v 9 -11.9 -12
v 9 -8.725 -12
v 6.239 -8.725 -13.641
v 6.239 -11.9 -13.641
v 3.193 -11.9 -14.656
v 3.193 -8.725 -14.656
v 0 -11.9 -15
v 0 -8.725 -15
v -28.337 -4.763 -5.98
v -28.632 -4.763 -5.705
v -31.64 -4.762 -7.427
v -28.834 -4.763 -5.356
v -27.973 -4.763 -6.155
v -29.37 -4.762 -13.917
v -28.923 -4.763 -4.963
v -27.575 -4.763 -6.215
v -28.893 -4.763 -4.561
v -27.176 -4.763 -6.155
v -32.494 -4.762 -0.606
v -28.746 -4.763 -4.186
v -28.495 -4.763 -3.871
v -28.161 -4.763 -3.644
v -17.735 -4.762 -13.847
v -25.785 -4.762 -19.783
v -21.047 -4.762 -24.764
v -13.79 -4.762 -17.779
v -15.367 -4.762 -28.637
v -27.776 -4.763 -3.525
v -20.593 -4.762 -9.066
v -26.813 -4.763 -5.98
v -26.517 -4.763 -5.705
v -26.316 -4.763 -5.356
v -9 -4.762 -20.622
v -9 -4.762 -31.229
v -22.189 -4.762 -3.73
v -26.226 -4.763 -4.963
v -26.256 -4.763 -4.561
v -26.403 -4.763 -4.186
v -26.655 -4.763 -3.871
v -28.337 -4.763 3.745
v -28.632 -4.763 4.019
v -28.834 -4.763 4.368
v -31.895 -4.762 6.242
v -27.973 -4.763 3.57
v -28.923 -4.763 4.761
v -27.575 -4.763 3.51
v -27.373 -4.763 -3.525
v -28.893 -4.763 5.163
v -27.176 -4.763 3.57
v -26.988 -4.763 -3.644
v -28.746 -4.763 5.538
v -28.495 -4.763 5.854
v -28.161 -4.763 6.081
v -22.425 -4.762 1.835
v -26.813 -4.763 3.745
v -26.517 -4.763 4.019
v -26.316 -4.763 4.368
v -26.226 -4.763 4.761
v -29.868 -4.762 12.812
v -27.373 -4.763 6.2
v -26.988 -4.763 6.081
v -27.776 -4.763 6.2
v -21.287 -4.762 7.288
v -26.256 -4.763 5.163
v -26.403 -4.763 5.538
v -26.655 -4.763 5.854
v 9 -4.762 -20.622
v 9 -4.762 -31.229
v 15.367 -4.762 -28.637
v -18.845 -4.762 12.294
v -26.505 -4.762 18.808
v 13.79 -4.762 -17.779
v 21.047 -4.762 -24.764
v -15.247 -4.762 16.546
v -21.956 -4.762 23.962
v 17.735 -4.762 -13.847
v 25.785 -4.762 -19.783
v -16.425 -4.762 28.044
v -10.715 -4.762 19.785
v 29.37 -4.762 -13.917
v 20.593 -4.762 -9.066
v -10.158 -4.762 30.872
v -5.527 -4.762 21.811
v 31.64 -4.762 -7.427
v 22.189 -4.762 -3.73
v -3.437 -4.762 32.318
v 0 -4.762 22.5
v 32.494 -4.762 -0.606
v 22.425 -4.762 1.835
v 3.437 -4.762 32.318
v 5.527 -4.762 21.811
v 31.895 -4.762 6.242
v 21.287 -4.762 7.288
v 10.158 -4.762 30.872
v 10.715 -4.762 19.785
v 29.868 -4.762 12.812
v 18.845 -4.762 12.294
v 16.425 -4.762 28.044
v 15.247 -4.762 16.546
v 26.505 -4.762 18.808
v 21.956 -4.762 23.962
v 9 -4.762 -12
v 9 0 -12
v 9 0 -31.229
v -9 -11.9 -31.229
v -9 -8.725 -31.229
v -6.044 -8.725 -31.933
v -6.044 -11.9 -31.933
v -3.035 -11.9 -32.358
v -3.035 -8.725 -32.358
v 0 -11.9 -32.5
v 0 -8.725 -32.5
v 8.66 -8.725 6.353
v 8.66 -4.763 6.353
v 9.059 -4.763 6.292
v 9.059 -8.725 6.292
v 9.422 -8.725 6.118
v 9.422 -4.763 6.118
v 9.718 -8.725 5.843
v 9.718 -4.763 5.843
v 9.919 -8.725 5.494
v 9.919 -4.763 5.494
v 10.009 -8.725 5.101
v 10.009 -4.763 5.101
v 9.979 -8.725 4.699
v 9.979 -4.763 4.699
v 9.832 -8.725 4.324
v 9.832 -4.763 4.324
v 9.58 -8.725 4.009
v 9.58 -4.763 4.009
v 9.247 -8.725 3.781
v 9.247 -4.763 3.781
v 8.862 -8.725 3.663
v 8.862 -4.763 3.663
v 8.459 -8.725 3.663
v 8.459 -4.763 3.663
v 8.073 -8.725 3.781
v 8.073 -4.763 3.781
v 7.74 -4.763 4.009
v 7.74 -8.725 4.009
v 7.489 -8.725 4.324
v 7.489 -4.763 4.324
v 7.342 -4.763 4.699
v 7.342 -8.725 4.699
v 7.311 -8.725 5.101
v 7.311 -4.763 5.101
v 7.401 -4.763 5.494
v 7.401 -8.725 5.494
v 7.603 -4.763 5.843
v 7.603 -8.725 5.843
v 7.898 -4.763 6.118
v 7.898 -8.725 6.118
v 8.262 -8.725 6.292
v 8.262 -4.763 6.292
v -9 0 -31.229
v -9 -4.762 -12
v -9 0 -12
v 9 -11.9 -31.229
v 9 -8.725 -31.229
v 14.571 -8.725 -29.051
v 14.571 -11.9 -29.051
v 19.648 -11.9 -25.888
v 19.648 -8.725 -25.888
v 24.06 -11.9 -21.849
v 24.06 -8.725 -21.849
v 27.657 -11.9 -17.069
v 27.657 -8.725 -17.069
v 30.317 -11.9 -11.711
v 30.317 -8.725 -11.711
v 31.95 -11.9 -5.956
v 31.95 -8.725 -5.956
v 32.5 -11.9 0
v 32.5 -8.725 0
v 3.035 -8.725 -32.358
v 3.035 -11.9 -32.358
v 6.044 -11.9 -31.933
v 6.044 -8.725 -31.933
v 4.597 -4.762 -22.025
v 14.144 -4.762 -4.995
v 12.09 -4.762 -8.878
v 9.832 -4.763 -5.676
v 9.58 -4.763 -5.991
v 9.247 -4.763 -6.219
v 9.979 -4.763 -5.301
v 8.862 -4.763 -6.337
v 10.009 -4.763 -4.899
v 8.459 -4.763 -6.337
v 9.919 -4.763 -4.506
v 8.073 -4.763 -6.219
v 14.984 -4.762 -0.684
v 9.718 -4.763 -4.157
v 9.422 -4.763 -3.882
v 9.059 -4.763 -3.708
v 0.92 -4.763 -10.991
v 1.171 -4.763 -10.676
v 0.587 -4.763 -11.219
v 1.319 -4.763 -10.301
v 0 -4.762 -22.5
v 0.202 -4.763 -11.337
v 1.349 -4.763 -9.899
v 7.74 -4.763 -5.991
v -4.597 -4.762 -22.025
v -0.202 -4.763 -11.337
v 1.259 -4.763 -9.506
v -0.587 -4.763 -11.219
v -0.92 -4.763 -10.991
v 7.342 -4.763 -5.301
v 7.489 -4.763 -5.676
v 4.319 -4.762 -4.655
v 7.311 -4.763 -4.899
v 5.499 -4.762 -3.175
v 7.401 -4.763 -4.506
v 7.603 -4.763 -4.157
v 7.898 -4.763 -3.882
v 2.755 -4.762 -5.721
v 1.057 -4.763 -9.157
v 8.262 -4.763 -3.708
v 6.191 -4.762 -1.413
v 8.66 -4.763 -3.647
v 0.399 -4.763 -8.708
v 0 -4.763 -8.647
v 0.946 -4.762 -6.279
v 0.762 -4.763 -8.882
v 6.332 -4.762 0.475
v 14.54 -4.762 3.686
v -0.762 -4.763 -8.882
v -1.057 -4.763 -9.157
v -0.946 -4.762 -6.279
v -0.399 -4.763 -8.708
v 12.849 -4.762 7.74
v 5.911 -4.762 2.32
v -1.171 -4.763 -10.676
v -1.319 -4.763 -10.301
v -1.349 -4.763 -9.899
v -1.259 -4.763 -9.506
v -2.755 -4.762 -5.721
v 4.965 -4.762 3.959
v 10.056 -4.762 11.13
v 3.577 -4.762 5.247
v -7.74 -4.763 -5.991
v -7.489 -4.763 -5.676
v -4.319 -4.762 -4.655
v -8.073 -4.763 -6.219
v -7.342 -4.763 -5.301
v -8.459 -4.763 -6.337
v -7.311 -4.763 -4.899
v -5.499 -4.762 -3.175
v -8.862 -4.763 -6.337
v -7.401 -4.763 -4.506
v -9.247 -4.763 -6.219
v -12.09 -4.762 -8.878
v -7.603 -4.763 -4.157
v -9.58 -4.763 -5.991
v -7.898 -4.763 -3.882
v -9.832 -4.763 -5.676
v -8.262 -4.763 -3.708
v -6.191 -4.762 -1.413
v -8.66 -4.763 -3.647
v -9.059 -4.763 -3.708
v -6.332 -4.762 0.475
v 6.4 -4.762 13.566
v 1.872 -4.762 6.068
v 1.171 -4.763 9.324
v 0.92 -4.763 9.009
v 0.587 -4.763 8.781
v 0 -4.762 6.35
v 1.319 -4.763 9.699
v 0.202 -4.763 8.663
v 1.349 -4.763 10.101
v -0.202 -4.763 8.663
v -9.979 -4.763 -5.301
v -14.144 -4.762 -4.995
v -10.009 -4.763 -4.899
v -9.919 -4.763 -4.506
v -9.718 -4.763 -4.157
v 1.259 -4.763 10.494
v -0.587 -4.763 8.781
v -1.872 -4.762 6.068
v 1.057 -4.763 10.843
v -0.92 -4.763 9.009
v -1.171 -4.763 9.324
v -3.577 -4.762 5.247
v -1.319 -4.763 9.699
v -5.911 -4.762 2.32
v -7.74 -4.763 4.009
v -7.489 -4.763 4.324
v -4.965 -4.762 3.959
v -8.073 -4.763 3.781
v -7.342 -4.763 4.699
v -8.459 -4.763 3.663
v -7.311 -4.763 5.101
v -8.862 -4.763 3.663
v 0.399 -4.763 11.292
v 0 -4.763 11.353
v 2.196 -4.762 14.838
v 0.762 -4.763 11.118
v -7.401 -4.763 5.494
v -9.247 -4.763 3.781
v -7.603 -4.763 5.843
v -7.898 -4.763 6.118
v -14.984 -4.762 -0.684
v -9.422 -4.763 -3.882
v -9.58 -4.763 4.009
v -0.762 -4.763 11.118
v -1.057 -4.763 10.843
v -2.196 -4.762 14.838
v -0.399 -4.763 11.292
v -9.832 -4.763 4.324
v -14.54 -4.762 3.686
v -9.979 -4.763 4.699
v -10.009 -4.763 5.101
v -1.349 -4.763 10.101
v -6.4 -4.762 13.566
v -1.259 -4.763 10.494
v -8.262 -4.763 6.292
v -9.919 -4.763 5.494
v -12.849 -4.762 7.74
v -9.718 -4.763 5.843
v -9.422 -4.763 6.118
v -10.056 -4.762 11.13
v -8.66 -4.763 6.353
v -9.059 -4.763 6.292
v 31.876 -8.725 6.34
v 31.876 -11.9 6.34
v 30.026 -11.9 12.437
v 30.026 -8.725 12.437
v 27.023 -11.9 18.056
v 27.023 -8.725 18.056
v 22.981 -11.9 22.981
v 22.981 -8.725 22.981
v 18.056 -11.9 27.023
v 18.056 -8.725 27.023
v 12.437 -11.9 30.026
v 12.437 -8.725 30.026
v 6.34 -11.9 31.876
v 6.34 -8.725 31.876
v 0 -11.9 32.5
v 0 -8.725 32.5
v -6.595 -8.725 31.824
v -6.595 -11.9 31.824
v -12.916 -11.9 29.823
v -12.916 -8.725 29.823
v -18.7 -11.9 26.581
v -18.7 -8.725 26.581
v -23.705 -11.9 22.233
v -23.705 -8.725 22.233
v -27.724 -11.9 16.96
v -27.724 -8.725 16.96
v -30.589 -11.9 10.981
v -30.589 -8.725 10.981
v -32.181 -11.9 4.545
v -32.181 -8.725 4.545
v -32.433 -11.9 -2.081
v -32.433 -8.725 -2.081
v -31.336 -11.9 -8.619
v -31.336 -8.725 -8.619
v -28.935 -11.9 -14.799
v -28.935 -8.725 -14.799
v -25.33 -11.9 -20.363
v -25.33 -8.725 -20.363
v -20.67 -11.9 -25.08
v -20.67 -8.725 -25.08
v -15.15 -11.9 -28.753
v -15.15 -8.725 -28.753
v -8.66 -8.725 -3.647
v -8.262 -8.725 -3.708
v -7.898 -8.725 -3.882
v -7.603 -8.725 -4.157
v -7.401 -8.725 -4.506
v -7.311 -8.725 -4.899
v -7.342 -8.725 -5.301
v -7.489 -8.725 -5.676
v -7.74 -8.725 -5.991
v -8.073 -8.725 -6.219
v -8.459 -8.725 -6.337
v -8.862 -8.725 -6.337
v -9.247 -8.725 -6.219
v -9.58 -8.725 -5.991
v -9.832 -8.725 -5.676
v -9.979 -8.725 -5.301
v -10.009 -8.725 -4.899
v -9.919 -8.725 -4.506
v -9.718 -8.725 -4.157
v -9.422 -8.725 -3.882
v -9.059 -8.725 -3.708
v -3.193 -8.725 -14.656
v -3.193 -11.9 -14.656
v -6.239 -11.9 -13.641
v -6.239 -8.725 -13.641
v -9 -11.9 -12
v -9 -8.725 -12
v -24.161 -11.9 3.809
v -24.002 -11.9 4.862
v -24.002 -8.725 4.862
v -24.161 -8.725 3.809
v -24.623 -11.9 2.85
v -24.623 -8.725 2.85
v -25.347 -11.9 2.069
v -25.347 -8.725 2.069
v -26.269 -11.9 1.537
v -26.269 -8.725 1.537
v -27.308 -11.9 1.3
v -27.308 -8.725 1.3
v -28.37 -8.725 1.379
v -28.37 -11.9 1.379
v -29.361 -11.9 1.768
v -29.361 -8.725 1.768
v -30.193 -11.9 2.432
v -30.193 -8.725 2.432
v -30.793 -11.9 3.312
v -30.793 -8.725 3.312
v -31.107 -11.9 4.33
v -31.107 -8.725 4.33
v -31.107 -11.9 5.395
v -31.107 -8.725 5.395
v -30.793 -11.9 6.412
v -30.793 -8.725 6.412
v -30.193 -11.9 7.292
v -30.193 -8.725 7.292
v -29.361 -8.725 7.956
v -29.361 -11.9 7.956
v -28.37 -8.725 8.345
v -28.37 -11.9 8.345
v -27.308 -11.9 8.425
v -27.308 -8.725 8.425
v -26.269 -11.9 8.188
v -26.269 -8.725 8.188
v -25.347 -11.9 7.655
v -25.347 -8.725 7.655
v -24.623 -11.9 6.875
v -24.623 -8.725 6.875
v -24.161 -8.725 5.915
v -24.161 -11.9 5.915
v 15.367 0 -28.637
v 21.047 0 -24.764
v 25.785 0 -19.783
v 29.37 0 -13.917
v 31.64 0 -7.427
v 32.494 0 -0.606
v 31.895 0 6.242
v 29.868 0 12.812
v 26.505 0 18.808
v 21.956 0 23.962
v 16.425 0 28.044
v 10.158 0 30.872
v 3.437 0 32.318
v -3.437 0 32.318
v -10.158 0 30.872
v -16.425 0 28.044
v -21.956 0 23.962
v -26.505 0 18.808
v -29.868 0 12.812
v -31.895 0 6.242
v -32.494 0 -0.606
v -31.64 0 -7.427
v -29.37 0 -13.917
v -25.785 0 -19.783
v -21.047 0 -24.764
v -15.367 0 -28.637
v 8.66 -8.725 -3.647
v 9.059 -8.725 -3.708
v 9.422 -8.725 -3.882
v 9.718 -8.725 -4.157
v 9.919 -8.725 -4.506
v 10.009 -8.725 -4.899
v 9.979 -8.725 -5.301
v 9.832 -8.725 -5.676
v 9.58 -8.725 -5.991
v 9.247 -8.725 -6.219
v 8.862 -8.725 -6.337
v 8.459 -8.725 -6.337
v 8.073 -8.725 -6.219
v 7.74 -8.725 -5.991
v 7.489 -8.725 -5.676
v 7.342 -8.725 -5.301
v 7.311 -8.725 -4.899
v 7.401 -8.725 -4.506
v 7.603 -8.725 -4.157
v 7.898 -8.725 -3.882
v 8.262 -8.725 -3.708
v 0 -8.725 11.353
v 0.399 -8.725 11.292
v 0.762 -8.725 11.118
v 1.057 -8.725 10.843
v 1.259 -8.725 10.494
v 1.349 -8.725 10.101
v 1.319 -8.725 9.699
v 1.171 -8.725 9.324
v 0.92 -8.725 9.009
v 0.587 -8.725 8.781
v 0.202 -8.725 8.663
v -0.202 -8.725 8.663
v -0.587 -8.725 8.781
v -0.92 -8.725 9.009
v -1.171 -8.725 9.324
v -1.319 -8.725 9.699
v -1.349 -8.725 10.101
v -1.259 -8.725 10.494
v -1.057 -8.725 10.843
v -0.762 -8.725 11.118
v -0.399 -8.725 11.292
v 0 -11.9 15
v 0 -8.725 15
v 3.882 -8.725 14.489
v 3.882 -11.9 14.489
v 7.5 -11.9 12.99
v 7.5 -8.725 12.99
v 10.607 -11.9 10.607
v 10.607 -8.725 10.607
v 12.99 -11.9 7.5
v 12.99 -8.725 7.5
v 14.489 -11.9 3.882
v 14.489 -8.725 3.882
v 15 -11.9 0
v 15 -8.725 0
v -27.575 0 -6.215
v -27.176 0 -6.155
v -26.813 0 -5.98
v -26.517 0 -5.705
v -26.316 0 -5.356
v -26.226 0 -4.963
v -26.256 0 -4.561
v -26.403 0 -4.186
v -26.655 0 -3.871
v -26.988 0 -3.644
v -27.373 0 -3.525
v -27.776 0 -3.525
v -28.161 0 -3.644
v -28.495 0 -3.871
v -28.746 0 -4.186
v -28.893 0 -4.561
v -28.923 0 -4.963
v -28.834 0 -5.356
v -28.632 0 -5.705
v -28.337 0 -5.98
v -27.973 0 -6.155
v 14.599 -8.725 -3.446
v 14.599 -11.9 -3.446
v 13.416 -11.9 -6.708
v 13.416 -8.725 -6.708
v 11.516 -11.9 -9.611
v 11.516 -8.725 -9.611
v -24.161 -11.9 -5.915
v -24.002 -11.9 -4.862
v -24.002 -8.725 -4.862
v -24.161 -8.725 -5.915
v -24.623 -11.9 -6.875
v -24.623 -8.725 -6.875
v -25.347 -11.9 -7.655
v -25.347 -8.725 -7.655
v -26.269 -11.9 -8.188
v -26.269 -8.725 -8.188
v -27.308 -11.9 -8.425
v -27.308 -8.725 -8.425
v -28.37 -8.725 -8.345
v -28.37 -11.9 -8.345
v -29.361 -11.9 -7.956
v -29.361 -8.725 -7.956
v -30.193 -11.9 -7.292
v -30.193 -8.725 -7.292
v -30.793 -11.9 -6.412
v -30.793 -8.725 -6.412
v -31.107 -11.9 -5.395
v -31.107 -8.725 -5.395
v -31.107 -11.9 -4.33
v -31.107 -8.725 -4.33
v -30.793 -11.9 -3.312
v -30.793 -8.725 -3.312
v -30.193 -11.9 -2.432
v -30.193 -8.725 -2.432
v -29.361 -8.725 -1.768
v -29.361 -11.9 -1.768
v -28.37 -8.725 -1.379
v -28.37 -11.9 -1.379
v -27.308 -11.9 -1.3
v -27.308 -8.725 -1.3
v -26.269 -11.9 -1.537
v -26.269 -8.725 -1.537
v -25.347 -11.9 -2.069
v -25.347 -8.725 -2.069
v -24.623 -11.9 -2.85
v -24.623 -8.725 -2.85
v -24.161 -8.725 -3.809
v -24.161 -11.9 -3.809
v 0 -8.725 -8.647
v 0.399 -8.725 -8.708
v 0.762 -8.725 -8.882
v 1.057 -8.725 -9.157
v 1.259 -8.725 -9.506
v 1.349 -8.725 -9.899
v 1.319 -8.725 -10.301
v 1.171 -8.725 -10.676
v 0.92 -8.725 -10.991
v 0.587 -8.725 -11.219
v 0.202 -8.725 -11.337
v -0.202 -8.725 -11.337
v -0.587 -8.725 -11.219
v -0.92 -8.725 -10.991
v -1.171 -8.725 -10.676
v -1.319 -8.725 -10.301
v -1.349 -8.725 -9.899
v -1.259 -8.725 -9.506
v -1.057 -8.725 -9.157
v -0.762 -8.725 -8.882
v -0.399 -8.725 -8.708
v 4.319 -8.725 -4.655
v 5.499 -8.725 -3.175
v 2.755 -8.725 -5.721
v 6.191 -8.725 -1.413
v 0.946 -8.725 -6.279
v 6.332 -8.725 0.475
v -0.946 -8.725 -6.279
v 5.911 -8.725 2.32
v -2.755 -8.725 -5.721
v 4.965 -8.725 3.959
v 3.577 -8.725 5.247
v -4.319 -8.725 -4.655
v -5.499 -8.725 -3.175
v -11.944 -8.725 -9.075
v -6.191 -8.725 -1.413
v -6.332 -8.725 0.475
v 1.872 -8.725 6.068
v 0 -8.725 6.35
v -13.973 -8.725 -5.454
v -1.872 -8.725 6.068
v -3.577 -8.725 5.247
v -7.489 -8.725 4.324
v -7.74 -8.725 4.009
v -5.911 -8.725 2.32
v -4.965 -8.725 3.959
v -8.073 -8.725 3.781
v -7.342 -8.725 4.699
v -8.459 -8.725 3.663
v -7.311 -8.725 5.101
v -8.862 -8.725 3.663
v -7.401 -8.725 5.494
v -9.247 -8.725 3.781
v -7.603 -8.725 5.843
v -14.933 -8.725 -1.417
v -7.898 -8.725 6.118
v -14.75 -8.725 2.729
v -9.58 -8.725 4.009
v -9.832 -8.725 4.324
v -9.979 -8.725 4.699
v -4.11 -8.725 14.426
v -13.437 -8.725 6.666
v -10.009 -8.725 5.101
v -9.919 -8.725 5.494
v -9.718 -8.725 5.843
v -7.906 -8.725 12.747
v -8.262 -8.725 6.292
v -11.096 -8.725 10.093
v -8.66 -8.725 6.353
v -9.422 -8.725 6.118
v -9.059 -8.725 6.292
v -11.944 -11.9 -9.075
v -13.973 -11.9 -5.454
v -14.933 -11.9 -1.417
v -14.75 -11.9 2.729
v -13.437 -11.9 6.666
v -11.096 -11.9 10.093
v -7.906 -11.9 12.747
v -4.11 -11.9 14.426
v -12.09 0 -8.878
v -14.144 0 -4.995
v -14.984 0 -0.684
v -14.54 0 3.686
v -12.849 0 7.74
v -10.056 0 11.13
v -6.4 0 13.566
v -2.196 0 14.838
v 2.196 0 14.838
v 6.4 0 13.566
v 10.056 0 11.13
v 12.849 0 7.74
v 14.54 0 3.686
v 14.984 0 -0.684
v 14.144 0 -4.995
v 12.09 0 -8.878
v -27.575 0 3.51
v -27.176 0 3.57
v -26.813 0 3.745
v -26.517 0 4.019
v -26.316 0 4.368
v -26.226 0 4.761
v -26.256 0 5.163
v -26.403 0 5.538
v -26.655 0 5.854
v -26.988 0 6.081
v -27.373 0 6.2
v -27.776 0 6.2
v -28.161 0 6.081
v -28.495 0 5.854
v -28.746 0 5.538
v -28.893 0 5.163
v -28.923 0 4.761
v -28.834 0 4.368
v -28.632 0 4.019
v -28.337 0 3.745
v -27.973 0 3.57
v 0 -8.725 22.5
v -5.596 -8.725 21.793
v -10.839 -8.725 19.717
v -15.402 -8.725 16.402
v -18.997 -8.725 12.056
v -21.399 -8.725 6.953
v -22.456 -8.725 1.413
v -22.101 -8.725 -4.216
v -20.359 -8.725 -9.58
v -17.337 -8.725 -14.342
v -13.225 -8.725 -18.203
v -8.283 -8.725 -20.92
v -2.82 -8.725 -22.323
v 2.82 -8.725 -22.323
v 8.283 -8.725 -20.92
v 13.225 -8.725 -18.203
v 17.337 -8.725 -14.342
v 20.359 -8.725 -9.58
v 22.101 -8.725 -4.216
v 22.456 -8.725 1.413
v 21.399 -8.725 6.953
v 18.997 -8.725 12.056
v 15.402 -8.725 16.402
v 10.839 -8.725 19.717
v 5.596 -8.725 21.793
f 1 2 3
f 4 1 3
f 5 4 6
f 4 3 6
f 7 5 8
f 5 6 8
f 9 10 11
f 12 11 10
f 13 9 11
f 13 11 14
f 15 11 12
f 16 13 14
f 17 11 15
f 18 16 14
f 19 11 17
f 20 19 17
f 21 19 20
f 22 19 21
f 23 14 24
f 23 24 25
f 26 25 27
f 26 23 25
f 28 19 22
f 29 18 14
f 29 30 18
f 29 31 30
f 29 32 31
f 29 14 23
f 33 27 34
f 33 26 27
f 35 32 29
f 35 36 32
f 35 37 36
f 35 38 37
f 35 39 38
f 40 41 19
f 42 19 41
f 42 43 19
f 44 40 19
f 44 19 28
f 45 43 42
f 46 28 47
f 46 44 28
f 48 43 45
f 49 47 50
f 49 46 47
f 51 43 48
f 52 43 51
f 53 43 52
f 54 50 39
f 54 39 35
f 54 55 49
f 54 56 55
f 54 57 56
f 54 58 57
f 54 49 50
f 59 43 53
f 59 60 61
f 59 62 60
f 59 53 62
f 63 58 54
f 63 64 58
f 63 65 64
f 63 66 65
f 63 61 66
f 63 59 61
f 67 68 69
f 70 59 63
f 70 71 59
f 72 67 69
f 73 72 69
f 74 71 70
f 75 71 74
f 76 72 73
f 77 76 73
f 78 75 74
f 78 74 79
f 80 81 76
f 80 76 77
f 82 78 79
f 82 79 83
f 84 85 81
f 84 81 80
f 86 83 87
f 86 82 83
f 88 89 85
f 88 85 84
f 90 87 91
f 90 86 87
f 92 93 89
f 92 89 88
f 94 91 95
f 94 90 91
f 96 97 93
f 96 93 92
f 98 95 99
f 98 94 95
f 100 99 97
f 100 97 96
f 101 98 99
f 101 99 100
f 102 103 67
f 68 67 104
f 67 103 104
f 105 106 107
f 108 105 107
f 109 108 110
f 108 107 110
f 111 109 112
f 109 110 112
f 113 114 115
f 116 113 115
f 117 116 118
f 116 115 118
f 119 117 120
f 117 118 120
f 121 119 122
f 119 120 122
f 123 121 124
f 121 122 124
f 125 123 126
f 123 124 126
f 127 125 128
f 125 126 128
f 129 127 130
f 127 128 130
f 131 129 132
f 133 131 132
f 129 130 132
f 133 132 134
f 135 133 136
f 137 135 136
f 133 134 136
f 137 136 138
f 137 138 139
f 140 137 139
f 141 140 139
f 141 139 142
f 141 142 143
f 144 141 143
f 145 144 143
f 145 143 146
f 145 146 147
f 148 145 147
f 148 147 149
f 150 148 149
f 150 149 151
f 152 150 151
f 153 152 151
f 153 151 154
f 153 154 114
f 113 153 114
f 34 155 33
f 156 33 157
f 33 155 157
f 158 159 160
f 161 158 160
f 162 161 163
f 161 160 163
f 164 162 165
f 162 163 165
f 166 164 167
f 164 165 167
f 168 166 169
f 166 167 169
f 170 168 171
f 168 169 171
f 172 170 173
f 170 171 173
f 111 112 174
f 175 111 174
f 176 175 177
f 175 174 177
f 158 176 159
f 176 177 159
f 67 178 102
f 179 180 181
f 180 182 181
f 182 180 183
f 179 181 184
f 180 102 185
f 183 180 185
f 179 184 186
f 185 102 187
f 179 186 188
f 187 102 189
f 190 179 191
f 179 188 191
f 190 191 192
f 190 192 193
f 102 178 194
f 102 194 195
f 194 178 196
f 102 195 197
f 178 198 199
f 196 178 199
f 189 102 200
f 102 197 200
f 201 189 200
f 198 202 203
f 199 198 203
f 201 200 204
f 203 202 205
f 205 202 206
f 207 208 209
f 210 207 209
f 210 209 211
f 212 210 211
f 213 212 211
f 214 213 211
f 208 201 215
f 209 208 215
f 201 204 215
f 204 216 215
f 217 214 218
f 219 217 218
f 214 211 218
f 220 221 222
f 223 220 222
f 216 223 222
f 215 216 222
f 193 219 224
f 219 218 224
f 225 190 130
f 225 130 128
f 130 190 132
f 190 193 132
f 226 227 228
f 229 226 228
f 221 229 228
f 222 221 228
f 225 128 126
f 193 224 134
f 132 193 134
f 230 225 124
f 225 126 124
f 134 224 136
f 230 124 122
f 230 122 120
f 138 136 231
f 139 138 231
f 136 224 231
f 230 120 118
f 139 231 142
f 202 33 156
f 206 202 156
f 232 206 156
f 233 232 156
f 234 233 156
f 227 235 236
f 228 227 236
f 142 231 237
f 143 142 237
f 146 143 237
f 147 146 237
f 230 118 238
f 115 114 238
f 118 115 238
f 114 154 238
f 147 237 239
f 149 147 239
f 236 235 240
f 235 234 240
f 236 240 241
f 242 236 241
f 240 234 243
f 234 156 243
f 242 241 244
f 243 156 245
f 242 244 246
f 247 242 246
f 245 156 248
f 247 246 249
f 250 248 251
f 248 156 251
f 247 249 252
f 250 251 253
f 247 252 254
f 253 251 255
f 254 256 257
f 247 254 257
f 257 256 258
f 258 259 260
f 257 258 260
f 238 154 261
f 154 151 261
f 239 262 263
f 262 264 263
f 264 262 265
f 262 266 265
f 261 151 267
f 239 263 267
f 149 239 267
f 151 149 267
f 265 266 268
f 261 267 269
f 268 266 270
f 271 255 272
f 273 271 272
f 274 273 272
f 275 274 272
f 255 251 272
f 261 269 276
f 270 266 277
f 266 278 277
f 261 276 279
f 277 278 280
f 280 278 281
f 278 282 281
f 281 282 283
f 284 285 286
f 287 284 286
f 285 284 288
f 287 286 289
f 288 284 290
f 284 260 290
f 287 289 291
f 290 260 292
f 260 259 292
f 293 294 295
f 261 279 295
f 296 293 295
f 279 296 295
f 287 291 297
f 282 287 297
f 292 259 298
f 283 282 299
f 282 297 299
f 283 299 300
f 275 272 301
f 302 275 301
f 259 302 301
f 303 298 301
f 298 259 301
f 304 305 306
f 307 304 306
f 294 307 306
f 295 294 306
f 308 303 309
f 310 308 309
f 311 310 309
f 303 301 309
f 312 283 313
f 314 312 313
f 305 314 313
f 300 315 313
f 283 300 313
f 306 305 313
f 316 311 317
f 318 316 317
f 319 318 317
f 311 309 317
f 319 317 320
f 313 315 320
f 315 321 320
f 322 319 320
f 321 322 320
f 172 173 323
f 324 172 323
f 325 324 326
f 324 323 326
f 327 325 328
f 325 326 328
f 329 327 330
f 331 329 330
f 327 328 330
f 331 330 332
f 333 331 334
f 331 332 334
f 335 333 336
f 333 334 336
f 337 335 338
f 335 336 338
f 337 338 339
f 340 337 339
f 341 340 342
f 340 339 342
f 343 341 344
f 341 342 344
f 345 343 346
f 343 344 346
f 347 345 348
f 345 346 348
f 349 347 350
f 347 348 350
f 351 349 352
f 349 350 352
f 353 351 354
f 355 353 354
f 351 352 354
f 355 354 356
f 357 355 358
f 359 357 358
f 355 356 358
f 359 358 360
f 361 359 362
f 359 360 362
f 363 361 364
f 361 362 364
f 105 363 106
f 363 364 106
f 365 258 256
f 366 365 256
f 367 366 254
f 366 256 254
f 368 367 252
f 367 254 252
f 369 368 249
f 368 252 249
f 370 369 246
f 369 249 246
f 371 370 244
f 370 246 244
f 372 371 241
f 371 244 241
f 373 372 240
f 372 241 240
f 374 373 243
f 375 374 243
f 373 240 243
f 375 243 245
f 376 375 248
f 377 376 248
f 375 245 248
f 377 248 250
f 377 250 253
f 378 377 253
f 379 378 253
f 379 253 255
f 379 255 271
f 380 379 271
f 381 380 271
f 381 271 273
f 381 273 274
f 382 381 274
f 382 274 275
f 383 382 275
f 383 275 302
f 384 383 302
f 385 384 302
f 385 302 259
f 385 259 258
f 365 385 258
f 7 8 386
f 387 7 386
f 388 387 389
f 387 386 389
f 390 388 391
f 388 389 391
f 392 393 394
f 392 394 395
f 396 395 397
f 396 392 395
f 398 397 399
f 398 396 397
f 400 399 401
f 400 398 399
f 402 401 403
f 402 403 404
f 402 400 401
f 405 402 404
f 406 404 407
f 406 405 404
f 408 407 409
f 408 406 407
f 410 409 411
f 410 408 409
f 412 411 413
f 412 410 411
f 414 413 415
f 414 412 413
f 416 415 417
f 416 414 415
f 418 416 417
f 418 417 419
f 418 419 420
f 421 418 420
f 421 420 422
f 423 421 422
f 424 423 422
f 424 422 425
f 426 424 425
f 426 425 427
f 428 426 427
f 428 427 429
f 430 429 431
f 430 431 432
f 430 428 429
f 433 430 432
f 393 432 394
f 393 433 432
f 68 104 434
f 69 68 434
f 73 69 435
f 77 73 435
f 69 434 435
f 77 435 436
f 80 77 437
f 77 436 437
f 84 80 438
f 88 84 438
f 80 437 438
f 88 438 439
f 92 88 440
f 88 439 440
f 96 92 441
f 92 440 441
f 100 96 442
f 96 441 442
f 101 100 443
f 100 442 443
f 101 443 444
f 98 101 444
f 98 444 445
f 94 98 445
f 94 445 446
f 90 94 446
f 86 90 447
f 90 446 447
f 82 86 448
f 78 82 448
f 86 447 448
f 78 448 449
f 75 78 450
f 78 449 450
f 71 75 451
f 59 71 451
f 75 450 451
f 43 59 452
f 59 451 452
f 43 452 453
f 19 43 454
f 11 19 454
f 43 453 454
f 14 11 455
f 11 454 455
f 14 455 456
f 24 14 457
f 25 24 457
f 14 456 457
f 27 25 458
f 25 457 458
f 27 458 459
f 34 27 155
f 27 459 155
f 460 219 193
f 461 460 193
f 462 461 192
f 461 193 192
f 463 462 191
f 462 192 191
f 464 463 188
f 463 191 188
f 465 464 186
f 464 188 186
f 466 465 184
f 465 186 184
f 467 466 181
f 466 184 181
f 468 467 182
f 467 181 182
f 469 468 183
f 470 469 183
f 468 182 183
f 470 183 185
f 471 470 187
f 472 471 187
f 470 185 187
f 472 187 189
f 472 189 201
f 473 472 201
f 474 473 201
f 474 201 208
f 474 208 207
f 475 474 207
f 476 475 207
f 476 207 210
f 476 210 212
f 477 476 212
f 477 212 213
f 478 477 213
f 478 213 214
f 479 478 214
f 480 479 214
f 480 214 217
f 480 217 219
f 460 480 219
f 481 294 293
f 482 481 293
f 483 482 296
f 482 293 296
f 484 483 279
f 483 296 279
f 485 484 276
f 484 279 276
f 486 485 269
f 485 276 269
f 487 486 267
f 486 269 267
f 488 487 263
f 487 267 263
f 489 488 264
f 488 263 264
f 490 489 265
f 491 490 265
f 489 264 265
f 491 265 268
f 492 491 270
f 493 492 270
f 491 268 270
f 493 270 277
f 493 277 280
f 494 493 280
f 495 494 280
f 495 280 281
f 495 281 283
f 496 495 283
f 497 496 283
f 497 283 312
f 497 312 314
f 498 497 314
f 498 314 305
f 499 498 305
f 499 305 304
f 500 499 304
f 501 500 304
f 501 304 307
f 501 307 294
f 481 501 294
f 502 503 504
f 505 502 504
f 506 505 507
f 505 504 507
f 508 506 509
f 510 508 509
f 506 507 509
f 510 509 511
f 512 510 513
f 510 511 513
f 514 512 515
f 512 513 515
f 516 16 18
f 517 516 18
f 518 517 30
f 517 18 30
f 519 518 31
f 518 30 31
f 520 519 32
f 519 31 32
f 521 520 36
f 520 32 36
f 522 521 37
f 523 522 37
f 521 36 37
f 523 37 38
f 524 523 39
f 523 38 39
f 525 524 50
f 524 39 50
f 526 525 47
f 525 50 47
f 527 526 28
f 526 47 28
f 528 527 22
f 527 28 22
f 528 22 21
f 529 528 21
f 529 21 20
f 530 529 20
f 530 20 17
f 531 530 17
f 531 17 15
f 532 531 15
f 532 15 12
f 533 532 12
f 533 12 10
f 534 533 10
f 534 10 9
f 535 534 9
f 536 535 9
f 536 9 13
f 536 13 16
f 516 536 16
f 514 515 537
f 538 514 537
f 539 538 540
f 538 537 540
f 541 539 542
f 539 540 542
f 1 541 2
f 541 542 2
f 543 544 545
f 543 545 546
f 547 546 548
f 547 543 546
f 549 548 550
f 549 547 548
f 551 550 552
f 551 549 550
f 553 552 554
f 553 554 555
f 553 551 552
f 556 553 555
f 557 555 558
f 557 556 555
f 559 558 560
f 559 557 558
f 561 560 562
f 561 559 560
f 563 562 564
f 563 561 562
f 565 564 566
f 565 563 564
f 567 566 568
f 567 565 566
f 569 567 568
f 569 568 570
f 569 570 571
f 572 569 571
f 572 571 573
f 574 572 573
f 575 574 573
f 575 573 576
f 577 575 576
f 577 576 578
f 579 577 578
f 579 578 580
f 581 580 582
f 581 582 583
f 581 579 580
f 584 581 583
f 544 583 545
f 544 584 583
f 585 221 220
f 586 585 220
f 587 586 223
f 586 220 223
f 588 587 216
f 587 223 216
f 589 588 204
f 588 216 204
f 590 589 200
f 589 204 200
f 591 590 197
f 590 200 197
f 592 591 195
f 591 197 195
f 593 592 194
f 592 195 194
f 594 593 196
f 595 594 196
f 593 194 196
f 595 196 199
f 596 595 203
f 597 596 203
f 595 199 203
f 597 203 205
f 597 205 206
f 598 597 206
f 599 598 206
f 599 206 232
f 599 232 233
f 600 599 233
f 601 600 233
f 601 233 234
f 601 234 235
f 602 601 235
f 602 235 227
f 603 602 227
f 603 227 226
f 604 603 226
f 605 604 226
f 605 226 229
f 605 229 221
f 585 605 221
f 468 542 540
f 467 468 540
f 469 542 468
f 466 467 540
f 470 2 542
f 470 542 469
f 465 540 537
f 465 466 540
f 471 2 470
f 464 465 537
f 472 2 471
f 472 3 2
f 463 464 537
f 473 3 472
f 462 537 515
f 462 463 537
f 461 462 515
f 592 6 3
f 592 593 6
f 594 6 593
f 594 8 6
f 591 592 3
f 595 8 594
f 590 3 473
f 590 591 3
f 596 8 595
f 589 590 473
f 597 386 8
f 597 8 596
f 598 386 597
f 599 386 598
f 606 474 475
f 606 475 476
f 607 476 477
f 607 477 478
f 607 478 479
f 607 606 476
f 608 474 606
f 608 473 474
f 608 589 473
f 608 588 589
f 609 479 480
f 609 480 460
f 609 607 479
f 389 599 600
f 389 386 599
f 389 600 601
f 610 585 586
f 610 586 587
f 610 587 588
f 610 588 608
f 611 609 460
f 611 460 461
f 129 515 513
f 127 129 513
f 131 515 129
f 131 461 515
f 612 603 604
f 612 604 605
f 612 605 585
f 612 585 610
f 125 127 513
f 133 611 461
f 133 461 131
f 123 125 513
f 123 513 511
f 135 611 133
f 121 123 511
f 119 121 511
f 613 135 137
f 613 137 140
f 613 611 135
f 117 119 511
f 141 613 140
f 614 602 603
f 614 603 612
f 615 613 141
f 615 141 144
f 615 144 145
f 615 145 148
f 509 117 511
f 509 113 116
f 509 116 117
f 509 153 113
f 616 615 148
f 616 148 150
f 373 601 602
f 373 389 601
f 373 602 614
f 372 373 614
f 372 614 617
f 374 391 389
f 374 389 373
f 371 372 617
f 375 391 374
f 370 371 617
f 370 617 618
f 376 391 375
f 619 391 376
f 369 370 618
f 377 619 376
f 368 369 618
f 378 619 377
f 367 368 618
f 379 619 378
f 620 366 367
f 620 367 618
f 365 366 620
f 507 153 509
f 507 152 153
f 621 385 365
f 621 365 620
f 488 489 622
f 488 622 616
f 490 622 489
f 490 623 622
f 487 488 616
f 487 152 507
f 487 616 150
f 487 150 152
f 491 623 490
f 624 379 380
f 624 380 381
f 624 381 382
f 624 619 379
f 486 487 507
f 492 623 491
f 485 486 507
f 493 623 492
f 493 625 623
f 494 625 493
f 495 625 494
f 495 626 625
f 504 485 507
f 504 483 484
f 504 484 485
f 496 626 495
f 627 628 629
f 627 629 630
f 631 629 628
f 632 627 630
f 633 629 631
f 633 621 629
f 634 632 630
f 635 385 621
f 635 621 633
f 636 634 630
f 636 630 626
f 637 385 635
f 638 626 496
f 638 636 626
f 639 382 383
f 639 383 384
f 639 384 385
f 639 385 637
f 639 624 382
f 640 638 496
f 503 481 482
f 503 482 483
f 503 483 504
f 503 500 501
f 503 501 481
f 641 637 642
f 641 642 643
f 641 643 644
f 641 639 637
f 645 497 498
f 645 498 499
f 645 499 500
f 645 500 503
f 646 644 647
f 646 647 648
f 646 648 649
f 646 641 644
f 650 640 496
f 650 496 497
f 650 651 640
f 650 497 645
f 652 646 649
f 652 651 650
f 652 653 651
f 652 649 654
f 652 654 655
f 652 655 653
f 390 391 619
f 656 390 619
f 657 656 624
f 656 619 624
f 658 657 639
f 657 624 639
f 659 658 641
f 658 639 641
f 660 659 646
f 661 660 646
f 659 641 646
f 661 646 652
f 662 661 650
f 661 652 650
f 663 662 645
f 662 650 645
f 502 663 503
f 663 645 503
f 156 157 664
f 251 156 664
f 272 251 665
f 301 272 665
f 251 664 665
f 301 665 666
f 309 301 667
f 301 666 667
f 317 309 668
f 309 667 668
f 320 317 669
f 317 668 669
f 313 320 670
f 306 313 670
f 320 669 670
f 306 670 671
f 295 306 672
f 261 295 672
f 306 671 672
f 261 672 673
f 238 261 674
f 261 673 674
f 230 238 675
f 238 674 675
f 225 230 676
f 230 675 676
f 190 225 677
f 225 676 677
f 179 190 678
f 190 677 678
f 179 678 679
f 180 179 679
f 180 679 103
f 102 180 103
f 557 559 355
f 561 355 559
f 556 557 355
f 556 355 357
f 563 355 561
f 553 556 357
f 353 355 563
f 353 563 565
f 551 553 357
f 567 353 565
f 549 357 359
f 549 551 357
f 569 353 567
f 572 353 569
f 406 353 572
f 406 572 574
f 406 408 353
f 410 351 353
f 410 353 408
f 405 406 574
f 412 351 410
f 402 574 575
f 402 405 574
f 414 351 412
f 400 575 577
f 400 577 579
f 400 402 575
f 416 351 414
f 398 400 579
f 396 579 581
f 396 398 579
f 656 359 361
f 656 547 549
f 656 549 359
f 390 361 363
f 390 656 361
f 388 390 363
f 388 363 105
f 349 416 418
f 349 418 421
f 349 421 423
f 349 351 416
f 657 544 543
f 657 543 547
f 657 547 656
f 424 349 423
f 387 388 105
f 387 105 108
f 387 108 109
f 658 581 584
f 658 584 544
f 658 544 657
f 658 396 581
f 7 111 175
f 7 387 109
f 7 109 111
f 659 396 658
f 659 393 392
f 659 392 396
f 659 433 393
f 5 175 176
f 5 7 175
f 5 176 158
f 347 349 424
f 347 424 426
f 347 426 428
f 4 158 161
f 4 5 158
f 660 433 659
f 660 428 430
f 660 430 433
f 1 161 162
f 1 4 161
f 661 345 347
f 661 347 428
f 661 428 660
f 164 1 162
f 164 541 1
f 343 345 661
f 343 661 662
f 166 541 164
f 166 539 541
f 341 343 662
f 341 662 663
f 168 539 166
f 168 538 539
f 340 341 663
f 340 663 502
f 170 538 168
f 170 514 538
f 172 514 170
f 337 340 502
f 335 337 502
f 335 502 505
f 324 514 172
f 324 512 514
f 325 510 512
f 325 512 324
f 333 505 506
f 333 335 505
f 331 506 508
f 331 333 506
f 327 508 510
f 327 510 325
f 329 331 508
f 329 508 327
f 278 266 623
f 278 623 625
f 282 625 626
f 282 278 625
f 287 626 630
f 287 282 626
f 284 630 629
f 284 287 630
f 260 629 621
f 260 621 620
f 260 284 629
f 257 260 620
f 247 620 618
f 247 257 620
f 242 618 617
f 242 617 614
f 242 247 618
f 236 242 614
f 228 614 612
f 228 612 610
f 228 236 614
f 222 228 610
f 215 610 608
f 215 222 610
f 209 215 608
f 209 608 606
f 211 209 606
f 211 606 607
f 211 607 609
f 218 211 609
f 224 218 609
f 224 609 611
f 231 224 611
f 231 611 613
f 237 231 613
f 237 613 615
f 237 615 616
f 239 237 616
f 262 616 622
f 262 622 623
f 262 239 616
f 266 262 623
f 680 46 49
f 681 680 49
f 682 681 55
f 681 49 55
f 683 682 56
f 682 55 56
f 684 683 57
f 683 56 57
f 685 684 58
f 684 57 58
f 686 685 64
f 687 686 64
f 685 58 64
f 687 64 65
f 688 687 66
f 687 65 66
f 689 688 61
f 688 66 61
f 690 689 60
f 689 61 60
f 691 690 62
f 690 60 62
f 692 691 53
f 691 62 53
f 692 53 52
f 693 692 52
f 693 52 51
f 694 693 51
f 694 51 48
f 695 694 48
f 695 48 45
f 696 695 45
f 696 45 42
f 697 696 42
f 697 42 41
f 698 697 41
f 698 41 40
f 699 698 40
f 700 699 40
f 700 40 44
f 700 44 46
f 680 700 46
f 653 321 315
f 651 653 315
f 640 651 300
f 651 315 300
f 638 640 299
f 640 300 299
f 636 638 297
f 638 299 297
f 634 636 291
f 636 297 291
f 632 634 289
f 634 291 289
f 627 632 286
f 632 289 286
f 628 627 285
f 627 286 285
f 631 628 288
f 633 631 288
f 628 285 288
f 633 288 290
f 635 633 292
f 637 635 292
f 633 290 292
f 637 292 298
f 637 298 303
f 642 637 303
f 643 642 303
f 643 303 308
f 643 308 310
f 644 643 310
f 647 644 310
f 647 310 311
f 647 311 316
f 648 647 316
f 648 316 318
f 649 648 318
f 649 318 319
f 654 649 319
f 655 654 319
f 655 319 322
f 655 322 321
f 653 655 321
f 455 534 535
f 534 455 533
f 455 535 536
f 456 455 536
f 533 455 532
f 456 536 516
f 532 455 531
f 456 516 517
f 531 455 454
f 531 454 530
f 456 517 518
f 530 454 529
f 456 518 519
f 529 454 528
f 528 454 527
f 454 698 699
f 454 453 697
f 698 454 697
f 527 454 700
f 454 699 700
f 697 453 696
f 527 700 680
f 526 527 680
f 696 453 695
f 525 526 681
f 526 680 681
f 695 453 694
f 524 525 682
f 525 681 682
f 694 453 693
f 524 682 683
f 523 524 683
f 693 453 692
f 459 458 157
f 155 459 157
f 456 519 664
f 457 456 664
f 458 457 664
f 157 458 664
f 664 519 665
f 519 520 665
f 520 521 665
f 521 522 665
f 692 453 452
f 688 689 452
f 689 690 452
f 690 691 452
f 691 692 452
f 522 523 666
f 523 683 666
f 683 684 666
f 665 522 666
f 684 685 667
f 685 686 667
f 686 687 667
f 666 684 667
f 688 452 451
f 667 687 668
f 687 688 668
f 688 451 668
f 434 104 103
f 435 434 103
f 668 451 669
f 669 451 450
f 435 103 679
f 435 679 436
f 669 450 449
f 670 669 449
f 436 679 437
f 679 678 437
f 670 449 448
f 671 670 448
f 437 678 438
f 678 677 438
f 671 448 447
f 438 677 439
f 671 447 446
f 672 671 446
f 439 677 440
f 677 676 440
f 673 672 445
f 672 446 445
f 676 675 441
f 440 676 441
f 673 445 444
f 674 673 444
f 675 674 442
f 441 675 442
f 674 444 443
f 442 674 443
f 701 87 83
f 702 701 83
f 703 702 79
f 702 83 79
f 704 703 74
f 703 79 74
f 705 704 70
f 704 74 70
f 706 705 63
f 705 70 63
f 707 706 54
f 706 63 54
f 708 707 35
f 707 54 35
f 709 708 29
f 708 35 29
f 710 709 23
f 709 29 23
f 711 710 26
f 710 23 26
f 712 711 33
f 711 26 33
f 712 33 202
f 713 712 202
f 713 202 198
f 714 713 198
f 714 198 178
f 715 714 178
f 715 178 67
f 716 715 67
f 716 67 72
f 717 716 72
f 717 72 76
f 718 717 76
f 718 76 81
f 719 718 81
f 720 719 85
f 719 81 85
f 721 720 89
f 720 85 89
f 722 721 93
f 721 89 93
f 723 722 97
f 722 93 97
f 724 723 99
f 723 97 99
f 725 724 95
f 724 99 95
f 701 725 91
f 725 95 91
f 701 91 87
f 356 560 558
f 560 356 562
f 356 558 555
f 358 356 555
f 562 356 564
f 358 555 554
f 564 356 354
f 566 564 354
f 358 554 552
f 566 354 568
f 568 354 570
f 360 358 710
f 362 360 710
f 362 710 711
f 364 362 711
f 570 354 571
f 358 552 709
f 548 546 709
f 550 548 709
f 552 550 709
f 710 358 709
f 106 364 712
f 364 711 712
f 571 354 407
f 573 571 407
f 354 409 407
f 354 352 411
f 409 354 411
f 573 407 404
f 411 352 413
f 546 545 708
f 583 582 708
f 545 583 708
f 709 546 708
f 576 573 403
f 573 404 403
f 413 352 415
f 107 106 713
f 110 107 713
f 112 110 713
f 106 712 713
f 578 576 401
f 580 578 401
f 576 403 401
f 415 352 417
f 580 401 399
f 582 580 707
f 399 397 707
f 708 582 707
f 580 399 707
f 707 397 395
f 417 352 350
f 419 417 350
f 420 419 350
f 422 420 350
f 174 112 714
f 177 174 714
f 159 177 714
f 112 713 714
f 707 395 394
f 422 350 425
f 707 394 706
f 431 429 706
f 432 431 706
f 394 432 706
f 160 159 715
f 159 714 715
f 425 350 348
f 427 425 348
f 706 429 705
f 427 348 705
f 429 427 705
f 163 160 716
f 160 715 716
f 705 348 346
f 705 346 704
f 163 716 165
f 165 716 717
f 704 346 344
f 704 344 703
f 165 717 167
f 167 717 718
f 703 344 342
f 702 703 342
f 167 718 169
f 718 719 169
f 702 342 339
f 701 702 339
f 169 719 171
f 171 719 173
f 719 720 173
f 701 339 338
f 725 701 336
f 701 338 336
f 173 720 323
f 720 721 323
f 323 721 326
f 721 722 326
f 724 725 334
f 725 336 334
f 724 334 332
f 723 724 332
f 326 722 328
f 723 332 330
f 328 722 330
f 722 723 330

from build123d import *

# Parameters (mm, degrees)
SPINDLE_START                             = 4.7625
SKETCH6_R                                 = 22.5
SKETCH6_R_2                               = 6.35
SPINDLE_CENTER_DEPTH                      = 3.9624
LOWER_START                               = 8.7249
LOWER_FLANGE_DEPTH                        = 3.175
UPPER_FLANGE_DEPTH                        = 4.7625
F_6_32_TAPPED_HOLE1_D                     = 2.7051
CBORE_START                               = -11.8999
CBORE_FOR_6_SOCKET_HEAD_CAP_SCREW1_OUTL_R = 3.57251
CBORE_FOR_6_SOCKET_HEAD_CAP_SCREW1_DEPTH  = 3.175
F_6_32_TAPPED_HOLE3_D                     = 2.7051
F_6_32_TAPPED_HOLE3_DEPTH                 = 9.49
F_6_32_TAPPED_HOLE3_TIP                   = 0.81269403


# Read off the part's stored shape, not the designer's step: CBORE for #6 Socket Head Cap Screw1
with BuildPart() as part:
    # Sketch6 → Spindle Center (new body)
    with BuildSketch(Plane.XZ.offset(SPINDLE_START)):
        with Locations(Location((0, 0, 0), (0, 0, 90))):
            Circle(SKETCH6_R)
        with Locations(Location((0, 0, 0), (0, 0, 90))):
            Circle(SKETCH6_R_2, mode=Mode.SUBTRACT)
    extrude(amount=SPINDLE_CENTER_DEPTH)

    # Sketch6<3> → Lower Flange (add)
    with BuildSketch(Plane.XZ.offset(LOWER_START)):
        with BuildLine():
            Line((0, -32.5), (0, -22.5))
            ThreePointArc((0, -22.5), (-4.596966983, -22.025392041), (-9, -20.621590627))
            Line((-9, -20.621590627), (-9, -31.228992939))
            ThreePointArc((-9, -31.228992939), (-4.544652323, -32.180679534), (0, -32.5))
        make_face()
        with BuildLine():
            Line((-9, -31.228992939), (-9, -20.621590627))
            ThreePointArc((-9, -20.621590627), (-22.025392041, 4.596966983), (0, 22.5))
            Line((0, 22.5), (0, 32.5))
            ThreePointArc((0, 32.5), (-32.180679534, 4.544652323), (-9, -31.228992939))
        make_face()
        with BuildLine():
            ThreePointArc((22.5, 0), (18.824850597, -12.323757544), (9, -20.621590627))
            Line((9, -20.621590627), (9, -31.228992939))
            ThreePointArc((9, -31.228992939), (25.968731197, -19.541622246), (32.5, 0))
            ThreePointArc((32.5, 0), (22.980970389, 22.980970389), (0, 32.5))
            Line((0, 32.5), (0, 22.5))
            ThreePointArc((0, 22.5), (15.909902577, 15.909902577), (22.5, 0))
        make_face()
        with BuildLine():
            Line((9, -31.228992939), (9, -20.621590627))
            ThreePointArc((9, -20.621590627), (4.596966983, -22.025392041), (0, -22.5))
            Line((0, -22.5), (0, -32.5))
            ThreePointArc((0, -32.5), (4.544652323, -32.180679534), (9, -31.228992939))
        make_face()
        with BuildLine():
            ThreePointArc((15, 0), (13.416407865, -6.708203932), (9, -12))
            Line((9, -12), (9, -20.621590627))
            ThreePointArc((9, -20.621590627), (18.824850597, -12.323757544), (22.5, 0))
            ThreePointArc((22.5, 0), (15.909902577, 15.909902577), (0, 22.5))
            Line((0, 22.5), (0, 15))
            ThreePointArc((0, 15), (10.606601718, 10.606601718), (15, 0))
        make_face()
        with BuildLine():
            Line((9, -20.621590627), (9, -12))
            ThreePointArc((9, -12), (4.74341649, -14.230249471), (0, -15))
            Line((0, -15), (0, -22.5))
            ThreePointArc((0, -22.5), (4.596966983, -22.025392041), (9, -20.621590627))
        make_face()
        with BuildLine():
            Line((0, -22.5), (0, -15))
            ThreePointArc((0, -15), (-4.74341649, -14.230249471), (-9, -12))
            Line((-9, -12), (-9, -20.621590627))
            ThreePointArc((-9, -20.621590627), (-4.596966983, -22.025392041), (0, -22.5))
        make_face()
        with BuildLine():
            Line((-9, -20.621590627), (-9, -12))
            ThreePointArc((-9, -12), (-14.230249471, 4.74341649), (0, 15))
            Line((0, 15), (0, 22.5))
            ThreePointArc((0, 22.5), (-22.025392041, 4.596966983), (-9, -20.621590627))
        make_face()
    extrude(amount=LOWER_FLANGE_DEPTH)

    # Sketch6<4> → Upper Flange (add)
    with BuildSketch(Plane.XZ):
        with BuildLine():
            Line((9, -12), (9, -31.228992939))
            ThreePointArc((9, -31.228992939), (0, 32.5), (-9, -31.228992939))
            Line((-9, -31.228992939), (-9, -12))
            ThreePointArc((-9, -12), (0, 15), (9, -12))
        make_face()
    extrude(amount=UPPER_FLANGE_DEPTH)

    # #6-32 Tapped Hole1 (through all)
    with Locations(Plane(origin=(0, -8.7249, 10), x_dir=(0, 0, -1), z_dir=(0, -1, 0))):
        with Locations((0, 0), (15, -8.660254038), (15, 8.660254038), (5, -8.660254038), (20, 0), (5, 8.660254038)):
            Hole(F_6_32_TAPPED_HOLE1_D / 2)

    # CBORE for #6 Socket Head Cap Screw1 outl → CBORE for #6 Socket Head Cap Screw1 (cut)
    with BuildSketch(Plane(origin=(0, 0, 0), x_dir=(1, 0, 0), z_dir=(0, 1, 0)).offset(CBORE_START)):
        with Locations((-27.574617084, -4.862148975)):
            Circle(CBORE_FOR_6_SOCKET_HEAD_CAP_SCREW1_OUTL_R)
        with Locations((-27.574617084, 4.862148975)):
            Circle(CBORE_FOR_6_SOCKET_HEAD_CAP_SCREW1_OUTL_R)
    extrude(amount=CBORE_FOR_6_SOCKET_HEAD_CAP_SCREW1_DEPTH, mode=Mode.SUBTRACT)

    # #6-32 Tapped Hole3
    with Locations(Plane(origin=(-27.574617084, 0, 4.862148975), x_dir=(0, 0, 1), z_dir=(0, 1, 0))):
        with Locations((0, 0), (-9.72429795, 0)):
            Hole(F_6_32_TAPPED_HOLE3_D / 2, depth=F_6_32_TAPPED_HOLE3_DEPTH)
            with Locations((0, 0, -(F_6_32_TAPPED_HOLE3_DEPTH + F_6_32_TAPPED_HOLE3_TIP / 2))):  # 118° drill point
                Cone(0, F_6_32_TAPPED_HOLE3_D / 2, F_6_32_TAPPED_HOLE3_TIP, mode=Mode.SUBTRACT)


solid = part.part
